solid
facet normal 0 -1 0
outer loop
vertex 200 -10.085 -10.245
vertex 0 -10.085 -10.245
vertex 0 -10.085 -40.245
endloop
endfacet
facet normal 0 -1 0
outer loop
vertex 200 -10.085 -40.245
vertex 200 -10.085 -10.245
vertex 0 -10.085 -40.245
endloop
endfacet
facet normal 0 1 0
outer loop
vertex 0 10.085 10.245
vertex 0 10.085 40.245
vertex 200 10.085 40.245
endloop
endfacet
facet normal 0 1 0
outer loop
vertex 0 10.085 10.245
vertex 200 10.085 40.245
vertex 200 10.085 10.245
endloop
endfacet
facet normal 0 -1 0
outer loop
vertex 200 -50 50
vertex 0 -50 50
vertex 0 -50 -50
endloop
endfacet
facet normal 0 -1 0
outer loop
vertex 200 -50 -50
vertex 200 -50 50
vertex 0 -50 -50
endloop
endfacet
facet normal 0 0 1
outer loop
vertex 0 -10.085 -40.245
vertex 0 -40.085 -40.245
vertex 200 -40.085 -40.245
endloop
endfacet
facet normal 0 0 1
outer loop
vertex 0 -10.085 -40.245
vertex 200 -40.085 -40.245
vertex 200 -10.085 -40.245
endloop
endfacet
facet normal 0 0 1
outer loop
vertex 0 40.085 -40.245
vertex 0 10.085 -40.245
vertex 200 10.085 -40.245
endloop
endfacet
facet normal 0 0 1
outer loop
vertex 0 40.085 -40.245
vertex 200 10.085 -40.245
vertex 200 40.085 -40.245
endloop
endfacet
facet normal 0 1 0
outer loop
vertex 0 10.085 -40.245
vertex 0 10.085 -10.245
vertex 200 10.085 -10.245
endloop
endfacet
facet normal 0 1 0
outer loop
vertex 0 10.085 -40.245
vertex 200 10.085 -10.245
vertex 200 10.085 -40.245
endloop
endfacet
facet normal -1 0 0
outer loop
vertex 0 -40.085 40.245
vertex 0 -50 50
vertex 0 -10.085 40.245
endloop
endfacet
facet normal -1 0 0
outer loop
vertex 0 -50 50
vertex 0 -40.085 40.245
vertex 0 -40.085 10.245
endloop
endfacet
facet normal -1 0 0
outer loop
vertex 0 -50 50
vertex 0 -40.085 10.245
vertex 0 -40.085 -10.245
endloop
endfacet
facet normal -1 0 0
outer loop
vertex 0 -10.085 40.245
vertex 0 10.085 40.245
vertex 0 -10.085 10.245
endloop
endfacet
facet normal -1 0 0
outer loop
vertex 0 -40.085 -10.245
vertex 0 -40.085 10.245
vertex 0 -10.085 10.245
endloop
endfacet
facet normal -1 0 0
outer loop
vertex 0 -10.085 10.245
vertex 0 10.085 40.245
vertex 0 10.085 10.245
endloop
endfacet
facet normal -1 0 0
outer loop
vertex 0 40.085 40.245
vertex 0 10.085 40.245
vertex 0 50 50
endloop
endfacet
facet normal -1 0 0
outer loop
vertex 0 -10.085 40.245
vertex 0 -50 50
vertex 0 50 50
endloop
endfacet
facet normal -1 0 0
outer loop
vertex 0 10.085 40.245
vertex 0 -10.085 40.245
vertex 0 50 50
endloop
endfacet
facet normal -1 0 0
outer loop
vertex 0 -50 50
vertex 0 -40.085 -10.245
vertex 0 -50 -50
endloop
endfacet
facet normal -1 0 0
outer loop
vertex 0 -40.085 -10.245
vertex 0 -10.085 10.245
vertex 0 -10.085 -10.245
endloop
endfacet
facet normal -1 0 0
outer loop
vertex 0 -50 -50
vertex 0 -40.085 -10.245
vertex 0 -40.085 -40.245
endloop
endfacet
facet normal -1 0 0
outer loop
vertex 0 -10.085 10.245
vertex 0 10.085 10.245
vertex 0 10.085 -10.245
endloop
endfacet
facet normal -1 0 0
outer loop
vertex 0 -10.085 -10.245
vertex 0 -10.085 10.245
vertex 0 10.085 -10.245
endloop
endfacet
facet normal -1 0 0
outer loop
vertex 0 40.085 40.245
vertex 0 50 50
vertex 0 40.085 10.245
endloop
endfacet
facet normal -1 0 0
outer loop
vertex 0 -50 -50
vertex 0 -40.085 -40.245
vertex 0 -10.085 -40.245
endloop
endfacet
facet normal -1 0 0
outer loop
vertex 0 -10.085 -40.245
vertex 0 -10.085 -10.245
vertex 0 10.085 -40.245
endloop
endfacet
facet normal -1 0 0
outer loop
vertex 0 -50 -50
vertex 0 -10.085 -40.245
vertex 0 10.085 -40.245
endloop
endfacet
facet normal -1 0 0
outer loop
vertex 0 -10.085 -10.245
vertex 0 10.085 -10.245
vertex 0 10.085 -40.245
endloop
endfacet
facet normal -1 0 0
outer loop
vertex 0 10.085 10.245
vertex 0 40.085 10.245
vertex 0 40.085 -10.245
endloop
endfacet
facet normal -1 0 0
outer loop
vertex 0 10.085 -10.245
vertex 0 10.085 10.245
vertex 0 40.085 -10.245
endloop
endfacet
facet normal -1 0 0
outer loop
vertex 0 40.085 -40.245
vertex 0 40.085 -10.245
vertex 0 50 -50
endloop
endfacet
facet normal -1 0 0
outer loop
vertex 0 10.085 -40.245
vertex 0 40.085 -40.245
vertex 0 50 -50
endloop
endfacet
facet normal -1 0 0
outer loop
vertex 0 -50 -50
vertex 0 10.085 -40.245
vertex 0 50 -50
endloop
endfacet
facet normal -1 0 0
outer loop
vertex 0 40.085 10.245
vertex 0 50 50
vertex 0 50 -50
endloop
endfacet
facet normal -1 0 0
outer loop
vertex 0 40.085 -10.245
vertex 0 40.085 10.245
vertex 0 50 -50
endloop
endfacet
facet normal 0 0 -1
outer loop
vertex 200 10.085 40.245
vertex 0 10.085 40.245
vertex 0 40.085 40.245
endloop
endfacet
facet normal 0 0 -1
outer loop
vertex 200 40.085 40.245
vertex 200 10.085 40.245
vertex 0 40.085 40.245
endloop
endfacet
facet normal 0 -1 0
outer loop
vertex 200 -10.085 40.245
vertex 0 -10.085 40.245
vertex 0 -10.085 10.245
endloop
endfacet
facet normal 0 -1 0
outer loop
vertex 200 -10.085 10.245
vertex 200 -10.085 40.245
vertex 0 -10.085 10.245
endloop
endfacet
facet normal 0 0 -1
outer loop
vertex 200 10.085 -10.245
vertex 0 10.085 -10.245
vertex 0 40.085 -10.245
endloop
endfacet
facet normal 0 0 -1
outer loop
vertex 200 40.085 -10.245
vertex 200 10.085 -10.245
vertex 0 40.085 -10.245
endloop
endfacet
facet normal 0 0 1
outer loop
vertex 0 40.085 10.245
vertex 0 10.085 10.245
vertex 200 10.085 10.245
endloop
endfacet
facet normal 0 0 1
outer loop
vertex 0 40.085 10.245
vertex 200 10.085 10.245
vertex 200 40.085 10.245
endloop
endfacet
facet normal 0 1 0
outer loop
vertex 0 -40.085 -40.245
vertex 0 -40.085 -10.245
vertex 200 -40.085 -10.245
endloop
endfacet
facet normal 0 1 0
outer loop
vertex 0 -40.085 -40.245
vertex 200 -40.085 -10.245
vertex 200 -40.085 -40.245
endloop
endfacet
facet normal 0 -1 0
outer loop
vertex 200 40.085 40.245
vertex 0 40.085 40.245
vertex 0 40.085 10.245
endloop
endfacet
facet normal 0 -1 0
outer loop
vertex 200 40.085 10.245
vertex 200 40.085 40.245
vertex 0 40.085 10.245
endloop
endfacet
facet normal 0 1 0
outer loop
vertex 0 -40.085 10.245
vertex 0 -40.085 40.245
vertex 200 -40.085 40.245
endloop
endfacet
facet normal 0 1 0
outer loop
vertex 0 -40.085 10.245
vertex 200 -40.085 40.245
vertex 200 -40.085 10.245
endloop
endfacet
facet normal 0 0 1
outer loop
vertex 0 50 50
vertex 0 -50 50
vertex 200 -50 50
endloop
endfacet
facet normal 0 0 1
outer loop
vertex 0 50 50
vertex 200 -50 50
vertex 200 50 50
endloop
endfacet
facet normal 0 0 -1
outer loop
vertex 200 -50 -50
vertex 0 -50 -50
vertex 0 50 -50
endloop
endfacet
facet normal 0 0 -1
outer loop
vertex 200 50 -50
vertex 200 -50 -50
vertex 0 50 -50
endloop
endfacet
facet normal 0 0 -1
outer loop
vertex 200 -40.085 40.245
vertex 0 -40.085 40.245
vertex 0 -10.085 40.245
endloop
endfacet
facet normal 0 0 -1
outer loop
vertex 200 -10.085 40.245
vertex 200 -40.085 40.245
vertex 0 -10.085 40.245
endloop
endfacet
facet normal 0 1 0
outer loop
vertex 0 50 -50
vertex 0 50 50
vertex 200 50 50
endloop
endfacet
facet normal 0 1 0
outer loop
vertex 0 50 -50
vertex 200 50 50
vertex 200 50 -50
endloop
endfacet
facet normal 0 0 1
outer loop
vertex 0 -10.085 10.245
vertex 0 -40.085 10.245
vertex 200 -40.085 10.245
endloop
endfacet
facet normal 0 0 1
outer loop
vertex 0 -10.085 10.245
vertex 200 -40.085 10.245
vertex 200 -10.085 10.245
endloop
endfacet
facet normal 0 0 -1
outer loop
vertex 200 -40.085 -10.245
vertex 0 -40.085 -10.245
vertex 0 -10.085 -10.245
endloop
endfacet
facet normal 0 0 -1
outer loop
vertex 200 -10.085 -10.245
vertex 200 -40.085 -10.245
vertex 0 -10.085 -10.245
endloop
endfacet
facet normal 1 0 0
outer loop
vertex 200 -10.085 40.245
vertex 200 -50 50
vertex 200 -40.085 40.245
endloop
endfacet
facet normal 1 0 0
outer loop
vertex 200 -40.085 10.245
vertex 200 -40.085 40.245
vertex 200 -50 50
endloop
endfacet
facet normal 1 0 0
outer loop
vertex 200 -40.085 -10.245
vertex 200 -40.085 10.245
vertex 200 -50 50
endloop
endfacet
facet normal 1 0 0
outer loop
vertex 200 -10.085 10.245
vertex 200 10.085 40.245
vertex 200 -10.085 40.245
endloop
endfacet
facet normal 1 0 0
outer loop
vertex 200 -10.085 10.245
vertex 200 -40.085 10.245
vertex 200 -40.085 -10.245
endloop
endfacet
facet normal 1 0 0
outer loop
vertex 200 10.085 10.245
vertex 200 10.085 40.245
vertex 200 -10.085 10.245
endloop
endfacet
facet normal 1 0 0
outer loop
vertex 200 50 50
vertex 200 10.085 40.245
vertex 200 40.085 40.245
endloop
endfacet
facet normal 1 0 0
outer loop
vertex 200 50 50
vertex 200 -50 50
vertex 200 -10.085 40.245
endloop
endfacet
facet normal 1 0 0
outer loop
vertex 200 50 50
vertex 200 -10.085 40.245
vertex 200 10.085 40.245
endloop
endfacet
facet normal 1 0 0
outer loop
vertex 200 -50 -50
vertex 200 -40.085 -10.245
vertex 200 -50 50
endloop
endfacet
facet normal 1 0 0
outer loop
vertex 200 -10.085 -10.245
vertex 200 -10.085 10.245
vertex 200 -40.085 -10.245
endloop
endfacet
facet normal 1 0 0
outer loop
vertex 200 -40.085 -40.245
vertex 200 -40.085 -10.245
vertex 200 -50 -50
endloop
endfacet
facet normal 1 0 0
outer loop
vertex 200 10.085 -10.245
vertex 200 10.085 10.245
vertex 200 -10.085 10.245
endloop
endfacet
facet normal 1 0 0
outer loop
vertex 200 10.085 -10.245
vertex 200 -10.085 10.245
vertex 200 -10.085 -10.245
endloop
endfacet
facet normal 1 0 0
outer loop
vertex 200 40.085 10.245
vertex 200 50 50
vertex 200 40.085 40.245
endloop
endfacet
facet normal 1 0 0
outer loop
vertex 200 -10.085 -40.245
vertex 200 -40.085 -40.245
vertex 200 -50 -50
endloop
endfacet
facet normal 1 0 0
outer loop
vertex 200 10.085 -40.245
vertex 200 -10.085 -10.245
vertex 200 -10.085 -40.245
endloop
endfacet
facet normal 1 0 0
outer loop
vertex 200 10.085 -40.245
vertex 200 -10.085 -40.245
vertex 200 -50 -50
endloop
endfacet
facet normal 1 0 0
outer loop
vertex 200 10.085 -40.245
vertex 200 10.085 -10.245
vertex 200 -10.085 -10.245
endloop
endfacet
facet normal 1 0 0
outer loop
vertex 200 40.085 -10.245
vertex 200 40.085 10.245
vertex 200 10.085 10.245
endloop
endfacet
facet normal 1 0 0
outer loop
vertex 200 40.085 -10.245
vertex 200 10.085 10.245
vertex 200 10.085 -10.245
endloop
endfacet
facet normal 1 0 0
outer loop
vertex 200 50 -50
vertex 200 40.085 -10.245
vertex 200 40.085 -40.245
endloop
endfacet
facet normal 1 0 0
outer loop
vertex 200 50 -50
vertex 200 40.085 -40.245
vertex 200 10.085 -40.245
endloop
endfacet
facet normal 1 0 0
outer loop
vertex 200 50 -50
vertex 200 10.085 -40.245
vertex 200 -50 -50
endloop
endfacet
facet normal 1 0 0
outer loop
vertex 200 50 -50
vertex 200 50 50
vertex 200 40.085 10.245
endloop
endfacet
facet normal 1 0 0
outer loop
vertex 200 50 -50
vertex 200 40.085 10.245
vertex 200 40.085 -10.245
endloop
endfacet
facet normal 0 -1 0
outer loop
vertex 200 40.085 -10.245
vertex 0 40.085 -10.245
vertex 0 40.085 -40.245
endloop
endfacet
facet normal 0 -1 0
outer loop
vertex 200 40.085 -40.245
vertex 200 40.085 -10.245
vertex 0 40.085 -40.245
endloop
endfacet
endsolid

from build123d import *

# Parameters (mm, degrees)
SKETCH_W             = 100
SKETCH_H             = 100
SKETCH_W_2           = 30
SKETCH_H_2           = 30
PAD_DEPTH            = 200
BODY_PLACEMENT_ANGLE = 90


with BuildPart() as part:
    # Sketch → Pad (new body)
    with BuildSketch(Plane.XY):
        Rectangle(SKETCH_W, SKETCH_H)
        with Locations((-25.244661, 25.084817)):
            Rectangle(SKETCH_W_2, SKETCH_H_2, mode=Mode.SUBTRACT)
        with Locations((-25.244661, -25.084817)):
            Rectangle(SKETCH_W_2, SKETCH_H_2, mode=Mode.SUBTRACT)
        with Locations((25.244661, 25.084817)):
            Rectangle(SKETCH_W_2, SKETCH_H_2, mode=Mode.SUBTRACT)
        with Locations((25.244661, -25.084817)):
            Rectangle(SKETCH_W_2, SKETCH_H_2, mode=Mode.SUBTRACT)
    extrude(amount=PAD_DEPTH)


with BuildPart() as part_1:
    # Body placement: moved
    add(part.part.rotate(Axis((0, 0, 0), (0, 1, 0)), BODY_PLACEMENT_ANGLE))


solid = part_1.part
